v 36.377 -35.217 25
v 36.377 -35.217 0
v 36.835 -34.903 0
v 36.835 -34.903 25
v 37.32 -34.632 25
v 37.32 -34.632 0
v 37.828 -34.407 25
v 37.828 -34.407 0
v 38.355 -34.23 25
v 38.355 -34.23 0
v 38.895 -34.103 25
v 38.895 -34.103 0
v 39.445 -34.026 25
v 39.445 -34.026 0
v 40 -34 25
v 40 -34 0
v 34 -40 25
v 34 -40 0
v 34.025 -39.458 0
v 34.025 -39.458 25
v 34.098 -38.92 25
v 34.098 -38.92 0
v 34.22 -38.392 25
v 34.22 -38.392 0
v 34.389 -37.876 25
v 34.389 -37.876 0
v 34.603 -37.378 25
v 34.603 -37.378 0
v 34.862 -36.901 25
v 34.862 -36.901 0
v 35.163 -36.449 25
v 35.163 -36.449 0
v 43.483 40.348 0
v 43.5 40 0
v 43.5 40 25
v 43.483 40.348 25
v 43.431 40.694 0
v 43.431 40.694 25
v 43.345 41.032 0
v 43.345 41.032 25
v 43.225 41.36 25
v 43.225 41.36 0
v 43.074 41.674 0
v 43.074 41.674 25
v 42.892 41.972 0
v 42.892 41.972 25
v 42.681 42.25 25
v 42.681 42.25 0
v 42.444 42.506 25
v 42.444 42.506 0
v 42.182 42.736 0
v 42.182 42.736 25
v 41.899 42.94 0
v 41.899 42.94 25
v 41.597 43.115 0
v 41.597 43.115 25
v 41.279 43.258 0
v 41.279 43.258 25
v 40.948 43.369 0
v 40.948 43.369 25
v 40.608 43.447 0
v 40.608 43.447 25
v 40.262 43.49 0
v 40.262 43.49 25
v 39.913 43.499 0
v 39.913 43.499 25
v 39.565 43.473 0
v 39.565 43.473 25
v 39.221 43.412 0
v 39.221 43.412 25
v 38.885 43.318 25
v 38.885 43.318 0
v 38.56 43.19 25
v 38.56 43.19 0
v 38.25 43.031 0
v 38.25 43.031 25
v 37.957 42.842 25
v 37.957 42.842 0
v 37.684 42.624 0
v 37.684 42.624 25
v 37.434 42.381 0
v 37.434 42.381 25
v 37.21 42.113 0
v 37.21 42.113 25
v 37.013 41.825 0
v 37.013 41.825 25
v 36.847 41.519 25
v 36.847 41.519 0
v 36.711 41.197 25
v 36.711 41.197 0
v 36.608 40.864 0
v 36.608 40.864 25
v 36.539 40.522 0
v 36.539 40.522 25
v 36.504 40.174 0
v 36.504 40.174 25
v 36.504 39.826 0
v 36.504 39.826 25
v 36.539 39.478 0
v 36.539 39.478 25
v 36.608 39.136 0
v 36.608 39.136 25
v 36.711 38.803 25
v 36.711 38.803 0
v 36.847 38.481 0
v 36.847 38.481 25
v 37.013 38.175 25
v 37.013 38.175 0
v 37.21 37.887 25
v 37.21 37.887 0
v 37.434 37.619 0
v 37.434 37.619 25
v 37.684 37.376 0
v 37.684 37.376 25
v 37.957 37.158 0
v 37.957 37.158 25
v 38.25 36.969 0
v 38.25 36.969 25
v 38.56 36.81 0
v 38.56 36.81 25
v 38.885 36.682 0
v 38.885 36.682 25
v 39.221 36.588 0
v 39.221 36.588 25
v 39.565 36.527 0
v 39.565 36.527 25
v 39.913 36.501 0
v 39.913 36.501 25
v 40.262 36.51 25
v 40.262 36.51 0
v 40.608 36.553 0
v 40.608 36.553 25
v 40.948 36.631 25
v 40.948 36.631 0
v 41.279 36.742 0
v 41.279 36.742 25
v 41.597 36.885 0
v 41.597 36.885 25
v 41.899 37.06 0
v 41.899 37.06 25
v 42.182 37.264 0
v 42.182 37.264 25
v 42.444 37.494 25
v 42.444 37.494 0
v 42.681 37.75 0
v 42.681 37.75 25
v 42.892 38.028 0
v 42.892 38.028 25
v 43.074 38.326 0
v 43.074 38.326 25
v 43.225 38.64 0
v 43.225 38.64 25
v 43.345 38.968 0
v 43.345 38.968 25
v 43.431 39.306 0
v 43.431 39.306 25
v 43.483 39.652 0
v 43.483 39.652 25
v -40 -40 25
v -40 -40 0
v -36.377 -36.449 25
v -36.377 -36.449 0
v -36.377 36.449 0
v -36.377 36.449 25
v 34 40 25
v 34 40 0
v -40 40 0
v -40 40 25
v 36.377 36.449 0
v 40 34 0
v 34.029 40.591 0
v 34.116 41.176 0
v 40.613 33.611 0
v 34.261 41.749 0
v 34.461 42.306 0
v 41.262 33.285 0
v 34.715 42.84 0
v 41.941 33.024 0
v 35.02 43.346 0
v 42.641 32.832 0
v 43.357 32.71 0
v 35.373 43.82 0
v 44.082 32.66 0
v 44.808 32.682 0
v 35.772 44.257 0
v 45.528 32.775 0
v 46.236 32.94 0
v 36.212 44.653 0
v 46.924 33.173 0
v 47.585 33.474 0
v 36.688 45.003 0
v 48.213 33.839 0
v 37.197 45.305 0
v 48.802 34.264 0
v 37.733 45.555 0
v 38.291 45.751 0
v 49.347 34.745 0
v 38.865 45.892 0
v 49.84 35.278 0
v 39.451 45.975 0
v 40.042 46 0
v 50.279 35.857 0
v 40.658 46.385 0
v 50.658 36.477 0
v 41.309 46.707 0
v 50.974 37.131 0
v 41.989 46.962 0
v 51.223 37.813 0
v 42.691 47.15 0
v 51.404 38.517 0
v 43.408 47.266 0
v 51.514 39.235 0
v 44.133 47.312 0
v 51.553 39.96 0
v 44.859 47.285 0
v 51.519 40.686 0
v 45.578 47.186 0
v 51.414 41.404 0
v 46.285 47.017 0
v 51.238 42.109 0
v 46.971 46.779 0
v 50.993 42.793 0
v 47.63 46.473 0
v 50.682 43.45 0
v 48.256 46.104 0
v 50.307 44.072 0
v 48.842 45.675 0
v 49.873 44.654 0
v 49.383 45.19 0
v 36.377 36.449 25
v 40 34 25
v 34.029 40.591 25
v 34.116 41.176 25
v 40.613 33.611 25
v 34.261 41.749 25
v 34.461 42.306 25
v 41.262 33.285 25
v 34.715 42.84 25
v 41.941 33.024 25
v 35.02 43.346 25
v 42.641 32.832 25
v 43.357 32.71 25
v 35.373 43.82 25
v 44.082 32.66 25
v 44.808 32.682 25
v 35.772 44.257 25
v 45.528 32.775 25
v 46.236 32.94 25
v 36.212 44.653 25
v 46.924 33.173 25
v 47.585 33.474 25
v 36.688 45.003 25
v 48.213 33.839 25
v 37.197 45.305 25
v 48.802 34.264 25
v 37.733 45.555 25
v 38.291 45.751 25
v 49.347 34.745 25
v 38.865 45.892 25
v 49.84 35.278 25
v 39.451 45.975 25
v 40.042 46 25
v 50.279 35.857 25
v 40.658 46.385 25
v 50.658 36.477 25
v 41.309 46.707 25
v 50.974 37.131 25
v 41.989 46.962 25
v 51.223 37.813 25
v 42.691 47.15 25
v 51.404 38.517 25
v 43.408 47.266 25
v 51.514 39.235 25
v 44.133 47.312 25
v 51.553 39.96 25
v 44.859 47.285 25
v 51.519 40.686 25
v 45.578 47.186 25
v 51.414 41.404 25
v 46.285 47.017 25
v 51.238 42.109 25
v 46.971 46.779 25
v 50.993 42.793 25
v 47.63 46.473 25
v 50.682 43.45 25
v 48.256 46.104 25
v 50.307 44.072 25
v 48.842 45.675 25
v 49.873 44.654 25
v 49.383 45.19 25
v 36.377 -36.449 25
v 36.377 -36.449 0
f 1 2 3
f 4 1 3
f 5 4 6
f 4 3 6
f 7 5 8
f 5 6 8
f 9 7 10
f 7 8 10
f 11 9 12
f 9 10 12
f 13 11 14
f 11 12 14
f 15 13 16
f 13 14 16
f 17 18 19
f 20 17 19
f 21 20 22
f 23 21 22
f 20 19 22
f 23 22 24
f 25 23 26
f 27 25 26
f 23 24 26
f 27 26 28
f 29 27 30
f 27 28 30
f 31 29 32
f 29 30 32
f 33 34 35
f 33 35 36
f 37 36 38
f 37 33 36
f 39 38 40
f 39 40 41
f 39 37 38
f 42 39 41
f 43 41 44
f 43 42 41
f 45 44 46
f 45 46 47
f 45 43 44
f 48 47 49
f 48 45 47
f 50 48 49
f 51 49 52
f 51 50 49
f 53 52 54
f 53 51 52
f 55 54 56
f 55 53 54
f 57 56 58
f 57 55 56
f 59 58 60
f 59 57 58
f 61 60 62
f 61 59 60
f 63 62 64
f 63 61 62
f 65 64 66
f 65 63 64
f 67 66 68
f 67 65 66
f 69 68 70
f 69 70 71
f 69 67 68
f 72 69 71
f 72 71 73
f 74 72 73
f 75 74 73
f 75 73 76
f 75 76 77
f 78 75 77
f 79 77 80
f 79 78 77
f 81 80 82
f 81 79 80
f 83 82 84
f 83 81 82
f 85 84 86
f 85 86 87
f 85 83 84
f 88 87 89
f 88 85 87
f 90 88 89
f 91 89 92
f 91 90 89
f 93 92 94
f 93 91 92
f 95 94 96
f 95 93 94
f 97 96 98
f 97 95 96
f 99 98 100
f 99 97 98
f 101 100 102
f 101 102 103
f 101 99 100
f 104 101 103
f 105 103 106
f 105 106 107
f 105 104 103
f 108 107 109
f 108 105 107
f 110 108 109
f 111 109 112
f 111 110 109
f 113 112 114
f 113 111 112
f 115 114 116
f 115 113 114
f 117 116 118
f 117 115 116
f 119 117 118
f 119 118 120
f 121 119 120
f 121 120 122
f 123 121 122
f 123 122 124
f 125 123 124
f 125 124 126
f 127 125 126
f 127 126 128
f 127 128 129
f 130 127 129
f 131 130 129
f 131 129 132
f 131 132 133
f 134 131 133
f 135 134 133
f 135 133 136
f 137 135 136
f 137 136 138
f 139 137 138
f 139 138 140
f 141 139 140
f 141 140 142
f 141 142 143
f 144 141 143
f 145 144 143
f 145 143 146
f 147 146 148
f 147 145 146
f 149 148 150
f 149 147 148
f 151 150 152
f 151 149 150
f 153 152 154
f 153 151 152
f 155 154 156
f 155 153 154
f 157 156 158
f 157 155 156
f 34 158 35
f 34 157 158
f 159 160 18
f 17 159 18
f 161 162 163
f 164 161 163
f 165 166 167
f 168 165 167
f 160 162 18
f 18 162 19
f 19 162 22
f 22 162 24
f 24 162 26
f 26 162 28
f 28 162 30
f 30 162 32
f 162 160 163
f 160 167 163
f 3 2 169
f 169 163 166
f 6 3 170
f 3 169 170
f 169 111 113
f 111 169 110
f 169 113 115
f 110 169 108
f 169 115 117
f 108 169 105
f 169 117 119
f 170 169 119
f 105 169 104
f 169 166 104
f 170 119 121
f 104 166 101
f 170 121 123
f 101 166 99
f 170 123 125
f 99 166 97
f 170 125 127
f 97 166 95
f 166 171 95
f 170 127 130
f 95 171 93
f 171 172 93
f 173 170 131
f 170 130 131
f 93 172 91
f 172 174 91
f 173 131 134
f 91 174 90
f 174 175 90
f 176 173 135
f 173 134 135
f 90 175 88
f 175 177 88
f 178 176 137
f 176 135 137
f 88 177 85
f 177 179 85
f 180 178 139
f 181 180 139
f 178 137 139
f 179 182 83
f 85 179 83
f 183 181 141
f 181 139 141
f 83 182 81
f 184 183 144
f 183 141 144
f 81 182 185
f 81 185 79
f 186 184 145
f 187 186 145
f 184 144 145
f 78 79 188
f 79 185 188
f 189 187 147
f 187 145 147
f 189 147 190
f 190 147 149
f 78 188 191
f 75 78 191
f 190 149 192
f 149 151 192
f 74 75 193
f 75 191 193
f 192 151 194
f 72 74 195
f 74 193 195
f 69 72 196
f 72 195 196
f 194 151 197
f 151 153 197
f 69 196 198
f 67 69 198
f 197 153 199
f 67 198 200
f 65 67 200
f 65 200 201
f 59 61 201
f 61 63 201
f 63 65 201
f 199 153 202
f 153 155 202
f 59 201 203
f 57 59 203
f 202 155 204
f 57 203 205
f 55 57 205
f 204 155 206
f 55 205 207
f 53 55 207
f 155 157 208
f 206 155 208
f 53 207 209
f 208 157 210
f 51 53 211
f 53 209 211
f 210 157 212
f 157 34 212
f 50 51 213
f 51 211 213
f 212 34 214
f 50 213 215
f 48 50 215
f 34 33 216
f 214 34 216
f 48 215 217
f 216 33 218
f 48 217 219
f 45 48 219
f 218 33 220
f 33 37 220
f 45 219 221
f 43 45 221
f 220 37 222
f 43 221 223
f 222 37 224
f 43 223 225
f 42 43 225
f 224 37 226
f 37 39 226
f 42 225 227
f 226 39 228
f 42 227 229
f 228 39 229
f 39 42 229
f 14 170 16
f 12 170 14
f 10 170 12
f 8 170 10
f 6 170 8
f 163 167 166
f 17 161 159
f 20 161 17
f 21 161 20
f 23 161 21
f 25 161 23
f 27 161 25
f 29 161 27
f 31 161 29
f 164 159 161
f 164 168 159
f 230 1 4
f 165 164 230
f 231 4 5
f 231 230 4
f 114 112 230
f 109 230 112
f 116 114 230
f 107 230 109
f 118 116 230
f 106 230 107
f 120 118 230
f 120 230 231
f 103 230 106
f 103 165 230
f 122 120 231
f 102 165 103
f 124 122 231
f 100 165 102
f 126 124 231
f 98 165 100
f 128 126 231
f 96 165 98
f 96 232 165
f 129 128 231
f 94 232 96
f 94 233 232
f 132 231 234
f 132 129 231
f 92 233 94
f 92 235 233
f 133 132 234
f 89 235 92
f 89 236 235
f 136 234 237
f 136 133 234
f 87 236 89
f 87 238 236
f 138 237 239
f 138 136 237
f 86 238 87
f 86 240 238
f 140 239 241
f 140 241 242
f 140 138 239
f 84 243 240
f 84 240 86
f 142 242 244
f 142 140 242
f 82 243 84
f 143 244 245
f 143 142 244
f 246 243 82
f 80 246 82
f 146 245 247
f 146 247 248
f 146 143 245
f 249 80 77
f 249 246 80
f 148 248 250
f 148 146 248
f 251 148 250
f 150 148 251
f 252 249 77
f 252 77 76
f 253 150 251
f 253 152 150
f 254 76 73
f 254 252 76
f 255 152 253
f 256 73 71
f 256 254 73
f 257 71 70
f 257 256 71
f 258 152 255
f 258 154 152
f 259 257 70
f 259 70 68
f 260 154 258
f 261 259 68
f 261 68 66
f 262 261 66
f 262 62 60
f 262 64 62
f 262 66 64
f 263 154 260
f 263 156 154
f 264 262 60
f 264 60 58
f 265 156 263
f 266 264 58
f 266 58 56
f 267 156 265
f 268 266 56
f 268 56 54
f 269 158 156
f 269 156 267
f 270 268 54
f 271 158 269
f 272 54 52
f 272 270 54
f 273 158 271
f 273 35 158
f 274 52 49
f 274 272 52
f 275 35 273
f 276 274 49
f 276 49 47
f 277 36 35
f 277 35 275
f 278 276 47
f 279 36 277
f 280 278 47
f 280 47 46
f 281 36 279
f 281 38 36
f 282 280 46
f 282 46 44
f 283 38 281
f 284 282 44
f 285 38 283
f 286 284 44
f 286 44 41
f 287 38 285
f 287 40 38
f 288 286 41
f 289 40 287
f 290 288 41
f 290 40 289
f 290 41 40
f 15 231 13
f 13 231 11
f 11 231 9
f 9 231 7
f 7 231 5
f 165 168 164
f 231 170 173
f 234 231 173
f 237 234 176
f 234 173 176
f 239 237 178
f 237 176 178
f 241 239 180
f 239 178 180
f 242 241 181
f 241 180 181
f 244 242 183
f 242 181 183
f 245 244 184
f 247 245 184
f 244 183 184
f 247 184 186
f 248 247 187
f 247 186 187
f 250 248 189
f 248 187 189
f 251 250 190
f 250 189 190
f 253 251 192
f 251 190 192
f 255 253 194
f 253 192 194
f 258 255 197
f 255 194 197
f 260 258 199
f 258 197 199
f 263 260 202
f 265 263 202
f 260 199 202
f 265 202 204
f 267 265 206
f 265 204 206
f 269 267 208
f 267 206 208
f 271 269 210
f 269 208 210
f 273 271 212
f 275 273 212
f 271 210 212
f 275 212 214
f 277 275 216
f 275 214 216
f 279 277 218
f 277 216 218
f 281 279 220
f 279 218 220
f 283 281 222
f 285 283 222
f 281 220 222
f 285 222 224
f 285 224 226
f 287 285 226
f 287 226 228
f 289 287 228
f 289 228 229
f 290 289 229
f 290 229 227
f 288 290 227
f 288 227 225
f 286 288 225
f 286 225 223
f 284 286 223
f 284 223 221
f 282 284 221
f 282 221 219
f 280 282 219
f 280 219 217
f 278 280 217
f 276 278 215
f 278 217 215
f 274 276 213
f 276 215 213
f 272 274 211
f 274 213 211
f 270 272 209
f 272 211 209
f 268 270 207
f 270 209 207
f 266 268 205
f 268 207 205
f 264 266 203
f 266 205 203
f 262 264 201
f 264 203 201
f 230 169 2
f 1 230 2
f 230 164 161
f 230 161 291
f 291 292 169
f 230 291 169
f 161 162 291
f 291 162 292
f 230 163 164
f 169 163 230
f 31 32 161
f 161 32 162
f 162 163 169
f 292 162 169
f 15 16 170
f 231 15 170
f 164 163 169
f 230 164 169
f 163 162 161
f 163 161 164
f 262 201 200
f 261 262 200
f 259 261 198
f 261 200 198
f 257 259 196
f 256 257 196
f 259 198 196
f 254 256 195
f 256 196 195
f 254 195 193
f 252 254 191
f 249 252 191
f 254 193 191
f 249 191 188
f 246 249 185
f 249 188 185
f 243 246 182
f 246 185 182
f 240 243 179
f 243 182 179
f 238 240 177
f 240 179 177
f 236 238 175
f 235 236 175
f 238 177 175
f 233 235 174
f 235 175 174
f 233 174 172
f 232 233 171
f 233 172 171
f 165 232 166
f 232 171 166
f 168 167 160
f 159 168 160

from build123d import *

# Parameters (mm, degrees)
F0_W     = 72.7547705173
F0_H     = 72.898581624
F2_DEPTH = 25
F1_R     = 3.5


with BuildPart() as f2:
    # F0 (on Top) → F2 (new body)
    with BuildSketch(Plane.XY):
        Rectangle(F0_W, F0_H)
    extrude(amount=F2_DEPTH)


with BuildPart() as f2b:
    # F1 (on face) → F2, piece 2 (new body)
    with BuildSketch(Plane.XY):
        with BuildLine():
            Line((-40, -40), (34, -40))
            ThreePointArc((34, -40), (34.2982698217, -38.1317727723), (35.1634243248, -36.449290812))
            Line((35.1634243248, -36.449290812), (-36.3773852587, -36.449290812))
            Line((-36.3773852587, -36.449290812), (-36.3773852587, 36.449290812))
            Line((-36.3773852587, 36.449290812), (36.3773852587, 36.449290812))
            Line((36.3773852587, 36.449290812), (36.3773852587, -35.2170445919))
            ThreePointArc((36.3773852587, -35.2170445919), (38.0892059829, -34.3123936296), (40, -34))
            Line((40, -34), (40, 34))
            ThreePointArc((40, 34), (51.5527089924, 39.959987811), (40.0415608589, 45.9998560562))
            ThreePointArc((40.0415608589, 45.9998560562), (35.7720788296, 44.2573093119), (34, 40))
            Line((34, 40), (-40, 40))
            Line((-40, 40), (-40, -40))
        make_face()
        with Locations((40, 40)):
            Circle(F1_R, mode=Mode.SUBTRACT)
    extrude(amount=F2_DEPTH)


solid = Compound([f2.part, f2b.part])
